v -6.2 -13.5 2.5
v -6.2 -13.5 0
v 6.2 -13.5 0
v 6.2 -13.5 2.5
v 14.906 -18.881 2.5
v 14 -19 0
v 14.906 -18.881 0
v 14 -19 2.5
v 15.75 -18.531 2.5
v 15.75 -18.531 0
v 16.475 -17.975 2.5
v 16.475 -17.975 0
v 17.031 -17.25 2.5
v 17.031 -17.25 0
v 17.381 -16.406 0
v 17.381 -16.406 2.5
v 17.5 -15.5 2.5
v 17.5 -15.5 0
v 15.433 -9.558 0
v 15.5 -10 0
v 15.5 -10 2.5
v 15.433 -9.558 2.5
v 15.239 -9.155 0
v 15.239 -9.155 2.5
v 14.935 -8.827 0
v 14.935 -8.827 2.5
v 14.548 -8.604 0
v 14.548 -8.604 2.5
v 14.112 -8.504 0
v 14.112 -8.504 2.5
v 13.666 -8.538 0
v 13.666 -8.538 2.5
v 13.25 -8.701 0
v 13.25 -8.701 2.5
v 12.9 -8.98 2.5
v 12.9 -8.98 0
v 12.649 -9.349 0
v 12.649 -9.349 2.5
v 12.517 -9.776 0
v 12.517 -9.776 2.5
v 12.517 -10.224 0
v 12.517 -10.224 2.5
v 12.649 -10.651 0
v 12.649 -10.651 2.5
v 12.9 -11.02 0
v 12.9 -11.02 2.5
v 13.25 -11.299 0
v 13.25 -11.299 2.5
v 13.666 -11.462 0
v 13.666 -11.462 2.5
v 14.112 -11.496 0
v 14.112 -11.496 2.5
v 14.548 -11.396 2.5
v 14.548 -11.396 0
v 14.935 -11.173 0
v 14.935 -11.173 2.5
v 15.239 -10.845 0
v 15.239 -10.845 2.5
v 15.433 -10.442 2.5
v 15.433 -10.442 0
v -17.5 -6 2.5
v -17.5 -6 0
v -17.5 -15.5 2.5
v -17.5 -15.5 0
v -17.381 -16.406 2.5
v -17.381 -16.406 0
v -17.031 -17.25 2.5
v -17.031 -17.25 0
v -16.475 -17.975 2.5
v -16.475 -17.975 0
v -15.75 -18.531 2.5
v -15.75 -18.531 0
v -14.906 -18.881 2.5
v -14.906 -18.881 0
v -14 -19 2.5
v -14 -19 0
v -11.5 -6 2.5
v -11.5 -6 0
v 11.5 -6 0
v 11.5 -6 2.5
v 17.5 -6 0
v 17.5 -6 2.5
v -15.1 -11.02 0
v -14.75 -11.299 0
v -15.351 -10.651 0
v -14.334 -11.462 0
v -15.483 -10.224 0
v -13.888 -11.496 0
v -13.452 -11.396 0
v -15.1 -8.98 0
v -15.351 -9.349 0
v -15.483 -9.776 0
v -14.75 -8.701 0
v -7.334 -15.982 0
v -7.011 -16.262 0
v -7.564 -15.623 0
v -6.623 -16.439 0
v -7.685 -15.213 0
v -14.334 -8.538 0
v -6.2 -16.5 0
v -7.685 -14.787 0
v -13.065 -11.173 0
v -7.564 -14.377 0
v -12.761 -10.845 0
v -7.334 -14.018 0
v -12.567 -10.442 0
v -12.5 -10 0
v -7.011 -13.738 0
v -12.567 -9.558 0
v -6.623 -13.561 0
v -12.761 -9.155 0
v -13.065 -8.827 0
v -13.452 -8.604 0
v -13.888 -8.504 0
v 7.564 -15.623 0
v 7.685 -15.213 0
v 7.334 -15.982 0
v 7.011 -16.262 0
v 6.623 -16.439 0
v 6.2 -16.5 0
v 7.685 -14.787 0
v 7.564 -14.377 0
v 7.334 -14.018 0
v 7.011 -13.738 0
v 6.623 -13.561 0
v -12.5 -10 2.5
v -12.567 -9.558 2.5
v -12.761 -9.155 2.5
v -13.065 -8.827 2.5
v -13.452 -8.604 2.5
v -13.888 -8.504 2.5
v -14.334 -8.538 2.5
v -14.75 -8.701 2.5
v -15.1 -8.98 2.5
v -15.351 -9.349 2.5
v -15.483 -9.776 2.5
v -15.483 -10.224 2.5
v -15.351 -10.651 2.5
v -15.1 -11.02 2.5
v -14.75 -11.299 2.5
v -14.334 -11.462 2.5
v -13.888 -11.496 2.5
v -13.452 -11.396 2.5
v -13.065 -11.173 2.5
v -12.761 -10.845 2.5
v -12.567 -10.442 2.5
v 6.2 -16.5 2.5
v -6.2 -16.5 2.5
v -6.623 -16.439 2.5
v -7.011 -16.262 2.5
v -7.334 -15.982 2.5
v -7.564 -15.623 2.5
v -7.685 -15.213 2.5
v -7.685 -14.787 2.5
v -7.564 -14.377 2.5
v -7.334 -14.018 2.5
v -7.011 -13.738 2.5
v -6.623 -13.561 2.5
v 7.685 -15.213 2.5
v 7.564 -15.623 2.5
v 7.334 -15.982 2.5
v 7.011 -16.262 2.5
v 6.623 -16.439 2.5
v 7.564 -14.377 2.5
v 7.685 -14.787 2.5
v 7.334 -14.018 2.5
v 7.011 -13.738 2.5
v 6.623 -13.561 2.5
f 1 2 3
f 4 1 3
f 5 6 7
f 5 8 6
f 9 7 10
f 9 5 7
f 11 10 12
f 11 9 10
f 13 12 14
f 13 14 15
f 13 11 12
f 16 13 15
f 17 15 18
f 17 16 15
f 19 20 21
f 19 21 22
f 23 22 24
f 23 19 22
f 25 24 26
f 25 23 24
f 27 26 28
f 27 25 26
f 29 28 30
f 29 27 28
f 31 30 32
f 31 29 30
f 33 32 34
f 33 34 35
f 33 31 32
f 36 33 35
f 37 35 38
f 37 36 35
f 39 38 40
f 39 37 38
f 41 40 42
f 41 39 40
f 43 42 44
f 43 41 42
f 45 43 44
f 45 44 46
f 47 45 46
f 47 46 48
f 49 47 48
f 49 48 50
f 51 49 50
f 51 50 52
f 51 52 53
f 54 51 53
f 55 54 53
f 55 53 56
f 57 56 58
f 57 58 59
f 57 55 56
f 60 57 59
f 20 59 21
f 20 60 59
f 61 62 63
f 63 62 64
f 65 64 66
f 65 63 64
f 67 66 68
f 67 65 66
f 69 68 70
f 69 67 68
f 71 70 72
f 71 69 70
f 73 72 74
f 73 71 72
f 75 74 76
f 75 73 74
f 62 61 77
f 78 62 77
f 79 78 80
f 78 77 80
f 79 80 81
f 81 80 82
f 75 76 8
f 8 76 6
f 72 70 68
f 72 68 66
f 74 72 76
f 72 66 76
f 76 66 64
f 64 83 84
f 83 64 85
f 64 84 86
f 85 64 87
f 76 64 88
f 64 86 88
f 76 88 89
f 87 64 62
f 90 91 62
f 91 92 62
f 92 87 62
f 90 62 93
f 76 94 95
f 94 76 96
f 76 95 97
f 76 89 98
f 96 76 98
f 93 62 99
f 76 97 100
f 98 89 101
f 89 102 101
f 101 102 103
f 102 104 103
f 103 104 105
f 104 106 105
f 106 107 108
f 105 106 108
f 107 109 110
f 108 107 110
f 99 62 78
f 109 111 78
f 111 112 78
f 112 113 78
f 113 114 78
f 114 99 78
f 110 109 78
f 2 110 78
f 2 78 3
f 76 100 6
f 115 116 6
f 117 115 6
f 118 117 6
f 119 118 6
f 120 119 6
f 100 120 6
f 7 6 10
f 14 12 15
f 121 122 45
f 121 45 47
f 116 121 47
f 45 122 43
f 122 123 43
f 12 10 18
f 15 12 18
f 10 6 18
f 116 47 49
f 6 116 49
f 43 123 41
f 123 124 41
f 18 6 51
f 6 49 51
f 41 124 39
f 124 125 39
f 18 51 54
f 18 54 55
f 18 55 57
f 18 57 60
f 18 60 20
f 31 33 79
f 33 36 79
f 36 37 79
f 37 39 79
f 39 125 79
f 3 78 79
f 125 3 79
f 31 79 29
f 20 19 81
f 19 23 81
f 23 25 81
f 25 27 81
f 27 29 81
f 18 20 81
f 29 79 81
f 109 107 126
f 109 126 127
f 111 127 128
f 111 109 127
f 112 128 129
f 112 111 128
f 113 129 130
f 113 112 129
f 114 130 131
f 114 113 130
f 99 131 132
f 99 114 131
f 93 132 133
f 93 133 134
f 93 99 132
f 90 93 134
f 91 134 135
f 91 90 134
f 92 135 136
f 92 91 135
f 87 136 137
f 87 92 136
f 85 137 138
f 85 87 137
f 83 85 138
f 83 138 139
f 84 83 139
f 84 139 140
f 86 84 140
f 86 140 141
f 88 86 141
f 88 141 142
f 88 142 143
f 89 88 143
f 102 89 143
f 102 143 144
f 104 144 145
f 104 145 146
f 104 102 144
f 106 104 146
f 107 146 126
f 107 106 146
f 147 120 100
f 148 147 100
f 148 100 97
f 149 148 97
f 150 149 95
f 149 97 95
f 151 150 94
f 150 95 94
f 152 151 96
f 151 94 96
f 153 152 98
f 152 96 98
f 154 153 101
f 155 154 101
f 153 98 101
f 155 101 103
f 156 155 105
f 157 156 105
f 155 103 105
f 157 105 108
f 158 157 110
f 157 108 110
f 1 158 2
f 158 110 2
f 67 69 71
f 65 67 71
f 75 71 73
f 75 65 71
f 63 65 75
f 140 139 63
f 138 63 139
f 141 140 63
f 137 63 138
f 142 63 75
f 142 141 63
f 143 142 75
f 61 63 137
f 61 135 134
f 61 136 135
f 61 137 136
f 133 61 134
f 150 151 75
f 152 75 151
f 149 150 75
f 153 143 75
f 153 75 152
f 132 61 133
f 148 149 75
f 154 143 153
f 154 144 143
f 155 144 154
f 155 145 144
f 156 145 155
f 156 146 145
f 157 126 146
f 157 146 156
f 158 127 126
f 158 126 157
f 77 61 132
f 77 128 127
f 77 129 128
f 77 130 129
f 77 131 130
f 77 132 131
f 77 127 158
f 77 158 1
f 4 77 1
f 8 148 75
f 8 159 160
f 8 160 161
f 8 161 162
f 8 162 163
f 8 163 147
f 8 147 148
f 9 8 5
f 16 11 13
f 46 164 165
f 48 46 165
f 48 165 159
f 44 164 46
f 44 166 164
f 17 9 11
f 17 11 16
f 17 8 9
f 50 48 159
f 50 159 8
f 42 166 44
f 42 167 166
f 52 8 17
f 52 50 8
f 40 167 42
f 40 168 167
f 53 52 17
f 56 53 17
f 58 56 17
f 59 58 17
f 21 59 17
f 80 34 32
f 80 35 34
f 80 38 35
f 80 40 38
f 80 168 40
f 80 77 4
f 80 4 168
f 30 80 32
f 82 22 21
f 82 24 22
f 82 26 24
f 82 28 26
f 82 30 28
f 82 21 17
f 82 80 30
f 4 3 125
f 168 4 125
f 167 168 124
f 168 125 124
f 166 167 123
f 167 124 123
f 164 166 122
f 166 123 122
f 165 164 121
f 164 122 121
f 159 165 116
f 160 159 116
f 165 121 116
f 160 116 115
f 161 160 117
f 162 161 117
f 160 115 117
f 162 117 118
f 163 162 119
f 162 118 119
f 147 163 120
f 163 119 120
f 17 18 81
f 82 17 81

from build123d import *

# Parameters (mm, degrees)
SKETCH1_R           = 1
SKETCH1_R_2         = 1.5
SKETCH1_R_3         = 2
SKETCH1_W           = 23
SKETCH1_H           = 12
BOSS_EXTRUDE1_DEPTH = 2.5
FILLET1_R           = 3.5
SKETCH2_W           = 57.93350489
SKETCH2_H           = 33.625772429
CUT_EXTRUDE1_DEPTH  = 10


with BuildPart() as part:
    # Sketch1 → Boss-Extrude1 (new body)
    with BuildSketch(Plane.XY):
        with BuildLine():
            Line((-17.5, 9), (-17.5, -19))
            Line((-17.5, -19), (17.5, -19))
            Line((17.5, -19), (17.5, 9))
            ThreePointArc((17.5, 9), (0, 26), (-17.5, 9))
        make_face()
        with Locations((-14, 0)):
            Circle(SKETCH1_R, mode=Mode.SUBTRACT)
        with Locations((-14, -10)):
            Circle(SKETCH1_R_2, mode=Mode.SUBTRACT)
        with Locations((-8.5, 16)):
            Circle(SKETCH1_R_3, mode=Mode.SUBTRACT)
        with Locations((14, -10)):
            Circle(SKETCH1_R_2, mode=Mode.SUBTRACT)
        with Locations((14, 0)):
            Circle(SKETCH1_R, mode=Mode.SUBTRACT)
        with Locations((8.5, 16)):
            Circle(SKETCH1_R_3, mode=Mode.SUBTRACT)
        Rectangle(SKETCH1_W, SKETCH1_H, mode=Mode.SUBTRACT)
        with BuildLine():
            Line((-6.2, -13.5), (6.2, -13.5))
            ThreePointArc((6.2, -13.5), (7.7, -15), (6.2, -16.5))
            Line((6.2, -16.5), (-6.2, -16.5))
            ThreePointArc((-6.2, -16.5), (-7.7, -15), (-6.2, -13.5))
        make_face(mode=Mode.SUBTRACT)
    extrude(amount=BOSS_EXTRUDE1_DEPTH)

    # Fillet1
    fillet1_edges = [part.edges().sort_by_distance(p)[0] for p in [
        (17.5, -19, 1.25),
        (-17.5, -19, 1.25),
    ]]
    fillet(fillet1_edges, radius=FILLET1_R)

    # Sketch2 → Cut-Extrude1 (cut)
    with BuildSketch(Plane.XY.offset(2.5)):
        with Locations((-1.18759747, 10.812886215)):
            Rectangle(SKETCH2_W, SKETCH2_H)
    extrude(amount=-CUT_EXTRUDE1_DEPTH, mode=Mode.SUBTRACT)


solid = part.part
